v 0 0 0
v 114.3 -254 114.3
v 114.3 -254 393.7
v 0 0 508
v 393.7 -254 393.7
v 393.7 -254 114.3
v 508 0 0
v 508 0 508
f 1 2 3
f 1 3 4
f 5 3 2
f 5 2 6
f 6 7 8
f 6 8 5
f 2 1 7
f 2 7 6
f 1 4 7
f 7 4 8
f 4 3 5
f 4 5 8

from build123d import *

# Parameters (mm, degrees)
F0_W     = 508
F0_H     = 508
F1_DEPTH = 254
F3_DEPTH = 508.001
F5_DEPTH = 508


with BuildPart() as f1:
    # F0 (on Front) → F1 (new body)
    with BuildSketch(Plane.XZ):
        with Locations((254, 254)):
            Rectangle(F0_W, F0_H)
    extrude(amount=F1_DEPTH)

    # F2 (on face) → F3 (cut, through all)
    with BuildSketch(Plane.YZ.offset(508)):
        Polygon((-254, 508), (-254, 393.7), (0, 508), align=None)
        Polygon((0, 0), (-254, 114.3), (-254, 0), align=None)
    extrude(amount=-F3_DEPTH, mode=Mode.SUBTRACT)

    # F4 (on Top) → F5 (cut)
    with BuildSketch(Plane.XY):
        Polygon((0, -254), (114.3, -254), (0, 0), align=None)
        Polygon((393.7, -254), (508, -254), (542.023063, -254), (542.023063, 0), (508, 0), align=None)
    extrude(amount=F5_DEPTH, mode=Mode.SUBTRACT)


solid = f1.part
